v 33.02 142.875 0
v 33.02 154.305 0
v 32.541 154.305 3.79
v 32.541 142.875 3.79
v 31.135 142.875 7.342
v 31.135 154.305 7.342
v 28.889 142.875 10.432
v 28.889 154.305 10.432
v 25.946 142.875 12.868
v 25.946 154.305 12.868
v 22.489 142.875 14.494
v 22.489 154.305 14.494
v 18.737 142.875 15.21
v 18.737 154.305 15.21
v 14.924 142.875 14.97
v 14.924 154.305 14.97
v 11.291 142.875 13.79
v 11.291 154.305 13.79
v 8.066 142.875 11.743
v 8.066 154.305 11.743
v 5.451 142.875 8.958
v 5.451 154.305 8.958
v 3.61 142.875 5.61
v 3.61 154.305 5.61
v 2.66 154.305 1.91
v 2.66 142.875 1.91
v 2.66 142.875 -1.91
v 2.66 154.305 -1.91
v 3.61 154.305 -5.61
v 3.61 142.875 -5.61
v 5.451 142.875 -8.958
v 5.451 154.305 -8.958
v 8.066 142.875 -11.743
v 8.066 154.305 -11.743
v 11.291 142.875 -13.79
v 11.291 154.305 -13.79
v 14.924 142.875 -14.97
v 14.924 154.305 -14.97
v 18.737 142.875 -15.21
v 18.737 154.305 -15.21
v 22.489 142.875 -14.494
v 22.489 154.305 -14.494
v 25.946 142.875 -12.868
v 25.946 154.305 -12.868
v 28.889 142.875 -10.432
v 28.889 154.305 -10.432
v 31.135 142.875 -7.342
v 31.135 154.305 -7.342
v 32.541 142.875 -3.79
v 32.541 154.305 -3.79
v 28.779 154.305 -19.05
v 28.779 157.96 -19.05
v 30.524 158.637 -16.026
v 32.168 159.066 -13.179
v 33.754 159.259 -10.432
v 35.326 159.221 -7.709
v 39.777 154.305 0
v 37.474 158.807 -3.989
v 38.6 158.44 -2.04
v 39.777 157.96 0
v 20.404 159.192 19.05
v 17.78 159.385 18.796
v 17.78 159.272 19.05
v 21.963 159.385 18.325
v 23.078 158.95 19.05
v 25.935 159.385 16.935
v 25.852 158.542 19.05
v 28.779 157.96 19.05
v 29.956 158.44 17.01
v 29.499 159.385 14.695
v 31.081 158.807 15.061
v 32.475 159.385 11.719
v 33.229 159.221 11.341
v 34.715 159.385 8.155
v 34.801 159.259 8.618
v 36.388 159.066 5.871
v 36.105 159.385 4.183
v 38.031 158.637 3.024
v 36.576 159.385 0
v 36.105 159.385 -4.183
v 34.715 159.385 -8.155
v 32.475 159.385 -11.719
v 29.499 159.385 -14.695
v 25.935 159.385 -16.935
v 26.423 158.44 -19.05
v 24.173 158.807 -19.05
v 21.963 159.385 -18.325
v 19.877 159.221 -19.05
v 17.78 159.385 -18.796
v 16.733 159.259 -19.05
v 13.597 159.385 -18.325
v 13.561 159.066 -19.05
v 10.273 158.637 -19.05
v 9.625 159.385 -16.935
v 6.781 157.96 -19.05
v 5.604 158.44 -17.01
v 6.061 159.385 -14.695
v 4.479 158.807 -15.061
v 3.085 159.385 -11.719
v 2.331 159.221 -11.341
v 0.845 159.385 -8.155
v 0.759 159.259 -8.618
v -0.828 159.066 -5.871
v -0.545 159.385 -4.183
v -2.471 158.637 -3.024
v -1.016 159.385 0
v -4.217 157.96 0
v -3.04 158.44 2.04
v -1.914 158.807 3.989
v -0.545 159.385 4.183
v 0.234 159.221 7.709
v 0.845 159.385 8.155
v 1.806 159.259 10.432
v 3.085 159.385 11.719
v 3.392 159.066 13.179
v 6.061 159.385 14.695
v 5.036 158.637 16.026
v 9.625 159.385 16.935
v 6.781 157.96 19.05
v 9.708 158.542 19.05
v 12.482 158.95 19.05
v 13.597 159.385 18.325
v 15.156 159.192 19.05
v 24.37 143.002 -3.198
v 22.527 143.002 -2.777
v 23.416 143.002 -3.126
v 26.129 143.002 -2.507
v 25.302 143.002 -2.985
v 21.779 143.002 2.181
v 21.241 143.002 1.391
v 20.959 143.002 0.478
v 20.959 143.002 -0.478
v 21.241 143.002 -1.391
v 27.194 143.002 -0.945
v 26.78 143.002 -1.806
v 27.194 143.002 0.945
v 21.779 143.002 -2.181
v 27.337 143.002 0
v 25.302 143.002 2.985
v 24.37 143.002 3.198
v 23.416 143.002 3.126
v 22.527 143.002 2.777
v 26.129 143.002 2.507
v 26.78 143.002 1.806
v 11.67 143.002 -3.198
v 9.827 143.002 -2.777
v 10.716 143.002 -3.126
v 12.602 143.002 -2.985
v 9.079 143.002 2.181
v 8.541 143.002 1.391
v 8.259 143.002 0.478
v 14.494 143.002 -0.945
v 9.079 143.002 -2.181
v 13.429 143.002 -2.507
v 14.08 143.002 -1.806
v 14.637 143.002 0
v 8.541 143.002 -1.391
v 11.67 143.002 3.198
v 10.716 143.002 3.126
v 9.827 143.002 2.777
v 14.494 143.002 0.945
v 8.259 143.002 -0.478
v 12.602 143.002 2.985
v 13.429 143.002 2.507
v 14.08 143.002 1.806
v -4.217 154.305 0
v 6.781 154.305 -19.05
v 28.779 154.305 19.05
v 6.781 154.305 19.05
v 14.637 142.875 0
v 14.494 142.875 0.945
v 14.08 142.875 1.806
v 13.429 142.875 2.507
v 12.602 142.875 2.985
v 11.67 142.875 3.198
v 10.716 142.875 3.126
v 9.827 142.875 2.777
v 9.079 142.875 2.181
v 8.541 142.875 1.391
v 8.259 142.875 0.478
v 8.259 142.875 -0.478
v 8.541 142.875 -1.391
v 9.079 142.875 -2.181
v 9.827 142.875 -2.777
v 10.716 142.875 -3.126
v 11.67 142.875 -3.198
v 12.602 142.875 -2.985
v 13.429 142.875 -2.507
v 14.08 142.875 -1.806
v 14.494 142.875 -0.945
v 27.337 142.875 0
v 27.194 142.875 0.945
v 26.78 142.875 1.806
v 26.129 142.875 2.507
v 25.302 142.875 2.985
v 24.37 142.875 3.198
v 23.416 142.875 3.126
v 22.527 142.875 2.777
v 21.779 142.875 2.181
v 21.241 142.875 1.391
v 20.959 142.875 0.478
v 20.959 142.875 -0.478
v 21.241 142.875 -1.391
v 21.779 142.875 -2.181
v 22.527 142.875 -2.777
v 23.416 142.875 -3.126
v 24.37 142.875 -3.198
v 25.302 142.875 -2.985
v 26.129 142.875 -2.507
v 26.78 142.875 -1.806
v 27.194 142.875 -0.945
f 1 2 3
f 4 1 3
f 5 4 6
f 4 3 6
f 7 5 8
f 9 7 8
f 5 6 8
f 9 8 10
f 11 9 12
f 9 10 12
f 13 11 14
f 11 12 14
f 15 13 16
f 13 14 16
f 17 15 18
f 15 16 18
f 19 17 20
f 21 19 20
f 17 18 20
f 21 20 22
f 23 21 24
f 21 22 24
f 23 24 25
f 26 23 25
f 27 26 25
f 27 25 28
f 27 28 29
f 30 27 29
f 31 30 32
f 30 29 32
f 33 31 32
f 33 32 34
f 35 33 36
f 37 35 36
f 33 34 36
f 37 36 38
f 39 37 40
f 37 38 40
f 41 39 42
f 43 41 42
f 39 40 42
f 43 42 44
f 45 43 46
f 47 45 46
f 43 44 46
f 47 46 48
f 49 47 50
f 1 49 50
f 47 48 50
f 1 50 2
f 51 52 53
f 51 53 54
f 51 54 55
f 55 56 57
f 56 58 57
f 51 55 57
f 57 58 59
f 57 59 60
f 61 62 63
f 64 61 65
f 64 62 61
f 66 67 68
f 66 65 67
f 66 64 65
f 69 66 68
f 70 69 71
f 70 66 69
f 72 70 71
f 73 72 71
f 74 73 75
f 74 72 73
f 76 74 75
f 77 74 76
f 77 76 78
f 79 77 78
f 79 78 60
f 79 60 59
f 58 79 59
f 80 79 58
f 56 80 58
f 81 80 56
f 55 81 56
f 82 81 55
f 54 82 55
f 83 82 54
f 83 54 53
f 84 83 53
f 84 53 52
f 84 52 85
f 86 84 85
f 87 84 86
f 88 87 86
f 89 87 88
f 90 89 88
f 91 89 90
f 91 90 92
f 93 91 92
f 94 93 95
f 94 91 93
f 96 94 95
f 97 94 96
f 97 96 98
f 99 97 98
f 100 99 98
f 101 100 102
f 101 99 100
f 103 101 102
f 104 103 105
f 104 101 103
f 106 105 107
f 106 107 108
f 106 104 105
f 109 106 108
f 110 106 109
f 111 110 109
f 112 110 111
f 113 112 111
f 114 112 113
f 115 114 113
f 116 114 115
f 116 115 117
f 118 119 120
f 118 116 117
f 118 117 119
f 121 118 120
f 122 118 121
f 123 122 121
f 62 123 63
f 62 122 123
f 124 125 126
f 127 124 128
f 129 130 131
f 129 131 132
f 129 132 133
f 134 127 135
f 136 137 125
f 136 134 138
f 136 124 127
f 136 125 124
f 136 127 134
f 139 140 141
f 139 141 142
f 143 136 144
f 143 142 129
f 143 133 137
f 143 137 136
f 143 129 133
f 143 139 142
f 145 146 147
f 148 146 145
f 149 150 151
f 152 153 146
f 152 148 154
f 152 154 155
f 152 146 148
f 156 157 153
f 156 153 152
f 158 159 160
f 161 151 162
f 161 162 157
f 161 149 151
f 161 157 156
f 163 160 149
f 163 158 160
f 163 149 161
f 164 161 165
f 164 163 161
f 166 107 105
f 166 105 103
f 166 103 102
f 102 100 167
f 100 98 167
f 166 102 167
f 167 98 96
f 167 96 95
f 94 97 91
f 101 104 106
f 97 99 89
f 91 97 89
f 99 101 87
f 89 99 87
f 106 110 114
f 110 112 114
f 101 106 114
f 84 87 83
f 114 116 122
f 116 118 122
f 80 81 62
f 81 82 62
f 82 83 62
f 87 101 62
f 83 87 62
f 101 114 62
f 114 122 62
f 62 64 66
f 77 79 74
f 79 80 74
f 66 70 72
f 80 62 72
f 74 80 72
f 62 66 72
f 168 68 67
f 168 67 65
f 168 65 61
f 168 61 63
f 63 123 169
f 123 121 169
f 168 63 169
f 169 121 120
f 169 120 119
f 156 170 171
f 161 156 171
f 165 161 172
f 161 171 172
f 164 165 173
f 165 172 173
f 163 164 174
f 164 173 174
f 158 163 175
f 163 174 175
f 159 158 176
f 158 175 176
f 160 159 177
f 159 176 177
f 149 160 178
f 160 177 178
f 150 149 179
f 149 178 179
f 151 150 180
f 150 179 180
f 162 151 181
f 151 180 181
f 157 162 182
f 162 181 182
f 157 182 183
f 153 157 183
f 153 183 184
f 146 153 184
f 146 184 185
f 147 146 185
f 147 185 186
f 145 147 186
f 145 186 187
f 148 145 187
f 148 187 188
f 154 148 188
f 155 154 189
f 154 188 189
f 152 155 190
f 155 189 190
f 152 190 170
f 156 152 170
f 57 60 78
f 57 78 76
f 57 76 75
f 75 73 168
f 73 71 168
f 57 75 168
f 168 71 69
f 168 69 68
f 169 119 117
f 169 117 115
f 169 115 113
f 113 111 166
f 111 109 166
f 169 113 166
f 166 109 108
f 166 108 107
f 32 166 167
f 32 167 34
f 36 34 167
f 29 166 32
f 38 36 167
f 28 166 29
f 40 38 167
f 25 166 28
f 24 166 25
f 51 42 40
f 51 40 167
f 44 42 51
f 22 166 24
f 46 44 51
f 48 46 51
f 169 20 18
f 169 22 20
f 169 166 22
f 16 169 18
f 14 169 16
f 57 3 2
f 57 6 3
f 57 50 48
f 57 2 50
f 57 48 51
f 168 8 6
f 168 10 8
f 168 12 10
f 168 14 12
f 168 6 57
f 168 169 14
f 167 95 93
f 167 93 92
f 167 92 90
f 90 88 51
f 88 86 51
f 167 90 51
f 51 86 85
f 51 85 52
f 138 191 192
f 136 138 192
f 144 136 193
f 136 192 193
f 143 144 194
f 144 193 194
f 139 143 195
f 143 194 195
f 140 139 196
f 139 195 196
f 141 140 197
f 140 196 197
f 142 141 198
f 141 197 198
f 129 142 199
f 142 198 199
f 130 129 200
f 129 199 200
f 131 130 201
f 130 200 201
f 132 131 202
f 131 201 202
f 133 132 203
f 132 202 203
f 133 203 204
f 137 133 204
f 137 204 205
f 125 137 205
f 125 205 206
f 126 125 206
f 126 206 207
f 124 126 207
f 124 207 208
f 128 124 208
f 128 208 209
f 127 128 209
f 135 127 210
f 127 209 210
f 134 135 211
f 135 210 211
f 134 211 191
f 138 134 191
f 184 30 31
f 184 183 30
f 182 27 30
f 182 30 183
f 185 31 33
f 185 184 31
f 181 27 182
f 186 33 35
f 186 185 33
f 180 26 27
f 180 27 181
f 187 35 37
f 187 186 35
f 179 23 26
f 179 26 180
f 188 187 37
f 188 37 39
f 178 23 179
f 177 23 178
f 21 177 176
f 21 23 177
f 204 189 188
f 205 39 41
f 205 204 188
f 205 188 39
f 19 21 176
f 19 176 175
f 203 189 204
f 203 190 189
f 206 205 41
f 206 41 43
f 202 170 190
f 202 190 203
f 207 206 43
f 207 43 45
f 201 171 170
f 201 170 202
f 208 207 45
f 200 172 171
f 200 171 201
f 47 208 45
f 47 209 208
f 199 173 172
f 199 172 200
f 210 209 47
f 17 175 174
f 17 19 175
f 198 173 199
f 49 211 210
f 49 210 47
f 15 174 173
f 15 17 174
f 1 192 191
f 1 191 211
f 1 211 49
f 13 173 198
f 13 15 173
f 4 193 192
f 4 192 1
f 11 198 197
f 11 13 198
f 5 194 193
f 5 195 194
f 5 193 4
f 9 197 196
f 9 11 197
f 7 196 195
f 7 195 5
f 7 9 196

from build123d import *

# Parameters (mm, degrees)
PAD012_DEPTH    = 5.08
SKETCH059_R     = 15.24
PAD013_DEPTH    = 11.43
SKETCH065_R     = 3.20675
POCKET010_DEPTH = 0.127


with BuildPart() as part:
    # Sketch058 → Pad012 (new body)
    with BuildSketch(Plane.XZ):
        Polygon((21.997045, 0), (10.998523, 19.05), (-10.998523, 19.05), (-21.997045, 0), (-10.998523, -19.05), (10.998523, -19.05), align=None)
    extrude(amount=PAD012_DEPTH)

    # Sketch059 (on Face8 of Pad012) → Pad013 (join)
    with BuildSketch(Plane.XZ.offset(5.08)):
        Circle(SKETCH059_R)
    extrude(amount=PAD013_DEPTH)

    # Sketch062 → Groove002 (revolve, cut)
    with BuildSketch(Plane.YZ):
        Polygon((-3.874167, 27.49752), (3.874167, 10.09448), (15.071476, 25.506253), align=None)
    revolve(axis=Axis((0, 0, 0), (0, 1, 0)), mode=Mode.SUBTRACT)

    # Sketch065 (on Face11 of Groove002) → Pocket010 (cut)
    with BuildSketch(Plane.XZ.offset(16.51)):
        with Locations((6.35, 0)):
            Circle(SKETCH065_R)
        with Locations((-6.35, 0)):
            Circle(SKETCH065_R)
    extrude(amount=-POCKET010_DEPTH, mode=Mode.SUBTRACT)


with BuildPart() as part_1:
    # Body009 placement: moved
    add(part.part.moved(Location((17.78, 159.385, 0))))


solid = part_1.part
